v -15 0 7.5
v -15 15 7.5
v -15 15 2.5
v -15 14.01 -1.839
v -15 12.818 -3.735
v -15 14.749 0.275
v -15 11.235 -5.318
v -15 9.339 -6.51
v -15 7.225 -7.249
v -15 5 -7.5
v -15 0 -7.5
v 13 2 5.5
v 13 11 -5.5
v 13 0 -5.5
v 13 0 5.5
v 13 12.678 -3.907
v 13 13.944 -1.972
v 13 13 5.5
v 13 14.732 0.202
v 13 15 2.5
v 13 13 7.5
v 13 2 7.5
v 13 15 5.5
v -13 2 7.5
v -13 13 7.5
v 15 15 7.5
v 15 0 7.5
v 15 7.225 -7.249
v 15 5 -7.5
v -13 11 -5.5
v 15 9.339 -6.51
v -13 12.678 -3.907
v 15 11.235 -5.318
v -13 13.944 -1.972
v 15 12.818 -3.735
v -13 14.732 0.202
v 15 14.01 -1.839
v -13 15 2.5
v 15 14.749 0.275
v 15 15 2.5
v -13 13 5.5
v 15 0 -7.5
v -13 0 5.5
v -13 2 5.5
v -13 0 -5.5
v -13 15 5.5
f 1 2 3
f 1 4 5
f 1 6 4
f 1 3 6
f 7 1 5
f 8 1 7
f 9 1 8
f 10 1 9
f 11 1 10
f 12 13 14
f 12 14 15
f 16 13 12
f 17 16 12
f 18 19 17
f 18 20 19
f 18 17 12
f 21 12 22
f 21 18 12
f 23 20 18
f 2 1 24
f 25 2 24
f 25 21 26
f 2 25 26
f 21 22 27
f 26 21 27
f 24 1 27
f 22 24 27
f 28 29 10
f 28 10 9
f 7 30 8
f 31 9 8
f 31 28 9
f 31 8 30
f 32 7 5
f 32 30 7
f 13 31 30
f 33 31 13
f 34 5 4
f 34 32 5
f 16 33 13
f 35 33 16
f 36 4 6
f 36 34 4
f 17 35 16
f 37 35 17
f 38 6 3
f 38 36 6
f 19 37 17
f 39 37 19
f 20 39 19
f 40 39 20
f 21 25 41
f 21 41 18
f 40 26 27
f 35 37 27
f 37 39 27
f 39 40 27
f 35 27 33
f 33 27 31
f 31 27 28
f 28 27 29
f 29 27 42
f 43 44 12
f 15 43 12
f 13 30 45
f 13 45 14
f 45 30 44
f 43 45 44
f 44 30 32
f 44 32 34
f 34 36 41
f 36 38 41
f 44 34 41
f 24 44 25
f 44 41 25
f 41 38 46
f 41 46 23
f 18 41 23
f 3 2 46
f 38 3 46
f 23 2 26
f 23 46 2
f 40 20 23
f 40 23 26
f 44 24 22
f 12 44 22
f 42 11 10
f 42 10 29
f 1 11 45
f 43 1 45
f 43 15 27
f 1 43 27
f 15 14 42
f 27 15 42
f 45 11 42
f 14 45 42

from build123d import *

# Parameters (mm, degrees)
SKETCH12_W              = 30
SKETCH12_H              = 15
BOSS_EXTRUDE4_DEPTH     = 15
FILLET1_R               = 10
CUT_EXTRUDE8_DEPTH      = 23.5
CUT_EXTRUDE8_DEPTH_BACK = 23.5
SKETCH13_W              = 26
SKETCH13_H              = 11
SKETCH14_W              = 26
SKETCH14_H              = 11
CUT_EXTRUDE9_DEPTH      = 10


with BuildPart() as part:
    # Sketch12 → Boss-Extrude4 (new body)
    with BuildSketch(Plane(origin=(0, 0, 0), x_dir=(1, 0, 0), z_dir=(0, 1, 0))):
        Rectangle(SKETCH12_W, SKETCH12_H)
    extrude(amount=BOSS_EXTRUDE4_DEPTH)

    # Fillet1
    fillet1_edges = [part.edges().sort_by_distance(p)[0] for p in [
        (0, 15, -7.5),
    ]]
    fillet(fillet1_edges, radius=FILLET1_R)

    # Sketch13 → Cut-Extrude8 (cut, two sides: drawn at the far end of the back side and taken through both)
    with BuildSketch(Plane.XZ.offset(-CUT_EXTRUDE8_DEPTH_BACK)):
        Rectangle(SKETCH13_W, SKETCH13_H)
    extrude(amount=CUT_EXTRUDE8_DEPTH + CUT_EXTRUDE8_DEPTH_BACK, mode=Mode.SUBTRACT)

    # Sketch14 → Cut-Extrude9 (cut)
    with BuildSketch(Plane.XY.offset(7.5)):
        with Locations((0, 7.5)):
            Rectangle(SKETCH14_W, SKETCH14_H)
    extrude(amount=-CUT_EXTRUDE9_DEPTH, mode=Mode.SUBTRACT)


solid = part.part
